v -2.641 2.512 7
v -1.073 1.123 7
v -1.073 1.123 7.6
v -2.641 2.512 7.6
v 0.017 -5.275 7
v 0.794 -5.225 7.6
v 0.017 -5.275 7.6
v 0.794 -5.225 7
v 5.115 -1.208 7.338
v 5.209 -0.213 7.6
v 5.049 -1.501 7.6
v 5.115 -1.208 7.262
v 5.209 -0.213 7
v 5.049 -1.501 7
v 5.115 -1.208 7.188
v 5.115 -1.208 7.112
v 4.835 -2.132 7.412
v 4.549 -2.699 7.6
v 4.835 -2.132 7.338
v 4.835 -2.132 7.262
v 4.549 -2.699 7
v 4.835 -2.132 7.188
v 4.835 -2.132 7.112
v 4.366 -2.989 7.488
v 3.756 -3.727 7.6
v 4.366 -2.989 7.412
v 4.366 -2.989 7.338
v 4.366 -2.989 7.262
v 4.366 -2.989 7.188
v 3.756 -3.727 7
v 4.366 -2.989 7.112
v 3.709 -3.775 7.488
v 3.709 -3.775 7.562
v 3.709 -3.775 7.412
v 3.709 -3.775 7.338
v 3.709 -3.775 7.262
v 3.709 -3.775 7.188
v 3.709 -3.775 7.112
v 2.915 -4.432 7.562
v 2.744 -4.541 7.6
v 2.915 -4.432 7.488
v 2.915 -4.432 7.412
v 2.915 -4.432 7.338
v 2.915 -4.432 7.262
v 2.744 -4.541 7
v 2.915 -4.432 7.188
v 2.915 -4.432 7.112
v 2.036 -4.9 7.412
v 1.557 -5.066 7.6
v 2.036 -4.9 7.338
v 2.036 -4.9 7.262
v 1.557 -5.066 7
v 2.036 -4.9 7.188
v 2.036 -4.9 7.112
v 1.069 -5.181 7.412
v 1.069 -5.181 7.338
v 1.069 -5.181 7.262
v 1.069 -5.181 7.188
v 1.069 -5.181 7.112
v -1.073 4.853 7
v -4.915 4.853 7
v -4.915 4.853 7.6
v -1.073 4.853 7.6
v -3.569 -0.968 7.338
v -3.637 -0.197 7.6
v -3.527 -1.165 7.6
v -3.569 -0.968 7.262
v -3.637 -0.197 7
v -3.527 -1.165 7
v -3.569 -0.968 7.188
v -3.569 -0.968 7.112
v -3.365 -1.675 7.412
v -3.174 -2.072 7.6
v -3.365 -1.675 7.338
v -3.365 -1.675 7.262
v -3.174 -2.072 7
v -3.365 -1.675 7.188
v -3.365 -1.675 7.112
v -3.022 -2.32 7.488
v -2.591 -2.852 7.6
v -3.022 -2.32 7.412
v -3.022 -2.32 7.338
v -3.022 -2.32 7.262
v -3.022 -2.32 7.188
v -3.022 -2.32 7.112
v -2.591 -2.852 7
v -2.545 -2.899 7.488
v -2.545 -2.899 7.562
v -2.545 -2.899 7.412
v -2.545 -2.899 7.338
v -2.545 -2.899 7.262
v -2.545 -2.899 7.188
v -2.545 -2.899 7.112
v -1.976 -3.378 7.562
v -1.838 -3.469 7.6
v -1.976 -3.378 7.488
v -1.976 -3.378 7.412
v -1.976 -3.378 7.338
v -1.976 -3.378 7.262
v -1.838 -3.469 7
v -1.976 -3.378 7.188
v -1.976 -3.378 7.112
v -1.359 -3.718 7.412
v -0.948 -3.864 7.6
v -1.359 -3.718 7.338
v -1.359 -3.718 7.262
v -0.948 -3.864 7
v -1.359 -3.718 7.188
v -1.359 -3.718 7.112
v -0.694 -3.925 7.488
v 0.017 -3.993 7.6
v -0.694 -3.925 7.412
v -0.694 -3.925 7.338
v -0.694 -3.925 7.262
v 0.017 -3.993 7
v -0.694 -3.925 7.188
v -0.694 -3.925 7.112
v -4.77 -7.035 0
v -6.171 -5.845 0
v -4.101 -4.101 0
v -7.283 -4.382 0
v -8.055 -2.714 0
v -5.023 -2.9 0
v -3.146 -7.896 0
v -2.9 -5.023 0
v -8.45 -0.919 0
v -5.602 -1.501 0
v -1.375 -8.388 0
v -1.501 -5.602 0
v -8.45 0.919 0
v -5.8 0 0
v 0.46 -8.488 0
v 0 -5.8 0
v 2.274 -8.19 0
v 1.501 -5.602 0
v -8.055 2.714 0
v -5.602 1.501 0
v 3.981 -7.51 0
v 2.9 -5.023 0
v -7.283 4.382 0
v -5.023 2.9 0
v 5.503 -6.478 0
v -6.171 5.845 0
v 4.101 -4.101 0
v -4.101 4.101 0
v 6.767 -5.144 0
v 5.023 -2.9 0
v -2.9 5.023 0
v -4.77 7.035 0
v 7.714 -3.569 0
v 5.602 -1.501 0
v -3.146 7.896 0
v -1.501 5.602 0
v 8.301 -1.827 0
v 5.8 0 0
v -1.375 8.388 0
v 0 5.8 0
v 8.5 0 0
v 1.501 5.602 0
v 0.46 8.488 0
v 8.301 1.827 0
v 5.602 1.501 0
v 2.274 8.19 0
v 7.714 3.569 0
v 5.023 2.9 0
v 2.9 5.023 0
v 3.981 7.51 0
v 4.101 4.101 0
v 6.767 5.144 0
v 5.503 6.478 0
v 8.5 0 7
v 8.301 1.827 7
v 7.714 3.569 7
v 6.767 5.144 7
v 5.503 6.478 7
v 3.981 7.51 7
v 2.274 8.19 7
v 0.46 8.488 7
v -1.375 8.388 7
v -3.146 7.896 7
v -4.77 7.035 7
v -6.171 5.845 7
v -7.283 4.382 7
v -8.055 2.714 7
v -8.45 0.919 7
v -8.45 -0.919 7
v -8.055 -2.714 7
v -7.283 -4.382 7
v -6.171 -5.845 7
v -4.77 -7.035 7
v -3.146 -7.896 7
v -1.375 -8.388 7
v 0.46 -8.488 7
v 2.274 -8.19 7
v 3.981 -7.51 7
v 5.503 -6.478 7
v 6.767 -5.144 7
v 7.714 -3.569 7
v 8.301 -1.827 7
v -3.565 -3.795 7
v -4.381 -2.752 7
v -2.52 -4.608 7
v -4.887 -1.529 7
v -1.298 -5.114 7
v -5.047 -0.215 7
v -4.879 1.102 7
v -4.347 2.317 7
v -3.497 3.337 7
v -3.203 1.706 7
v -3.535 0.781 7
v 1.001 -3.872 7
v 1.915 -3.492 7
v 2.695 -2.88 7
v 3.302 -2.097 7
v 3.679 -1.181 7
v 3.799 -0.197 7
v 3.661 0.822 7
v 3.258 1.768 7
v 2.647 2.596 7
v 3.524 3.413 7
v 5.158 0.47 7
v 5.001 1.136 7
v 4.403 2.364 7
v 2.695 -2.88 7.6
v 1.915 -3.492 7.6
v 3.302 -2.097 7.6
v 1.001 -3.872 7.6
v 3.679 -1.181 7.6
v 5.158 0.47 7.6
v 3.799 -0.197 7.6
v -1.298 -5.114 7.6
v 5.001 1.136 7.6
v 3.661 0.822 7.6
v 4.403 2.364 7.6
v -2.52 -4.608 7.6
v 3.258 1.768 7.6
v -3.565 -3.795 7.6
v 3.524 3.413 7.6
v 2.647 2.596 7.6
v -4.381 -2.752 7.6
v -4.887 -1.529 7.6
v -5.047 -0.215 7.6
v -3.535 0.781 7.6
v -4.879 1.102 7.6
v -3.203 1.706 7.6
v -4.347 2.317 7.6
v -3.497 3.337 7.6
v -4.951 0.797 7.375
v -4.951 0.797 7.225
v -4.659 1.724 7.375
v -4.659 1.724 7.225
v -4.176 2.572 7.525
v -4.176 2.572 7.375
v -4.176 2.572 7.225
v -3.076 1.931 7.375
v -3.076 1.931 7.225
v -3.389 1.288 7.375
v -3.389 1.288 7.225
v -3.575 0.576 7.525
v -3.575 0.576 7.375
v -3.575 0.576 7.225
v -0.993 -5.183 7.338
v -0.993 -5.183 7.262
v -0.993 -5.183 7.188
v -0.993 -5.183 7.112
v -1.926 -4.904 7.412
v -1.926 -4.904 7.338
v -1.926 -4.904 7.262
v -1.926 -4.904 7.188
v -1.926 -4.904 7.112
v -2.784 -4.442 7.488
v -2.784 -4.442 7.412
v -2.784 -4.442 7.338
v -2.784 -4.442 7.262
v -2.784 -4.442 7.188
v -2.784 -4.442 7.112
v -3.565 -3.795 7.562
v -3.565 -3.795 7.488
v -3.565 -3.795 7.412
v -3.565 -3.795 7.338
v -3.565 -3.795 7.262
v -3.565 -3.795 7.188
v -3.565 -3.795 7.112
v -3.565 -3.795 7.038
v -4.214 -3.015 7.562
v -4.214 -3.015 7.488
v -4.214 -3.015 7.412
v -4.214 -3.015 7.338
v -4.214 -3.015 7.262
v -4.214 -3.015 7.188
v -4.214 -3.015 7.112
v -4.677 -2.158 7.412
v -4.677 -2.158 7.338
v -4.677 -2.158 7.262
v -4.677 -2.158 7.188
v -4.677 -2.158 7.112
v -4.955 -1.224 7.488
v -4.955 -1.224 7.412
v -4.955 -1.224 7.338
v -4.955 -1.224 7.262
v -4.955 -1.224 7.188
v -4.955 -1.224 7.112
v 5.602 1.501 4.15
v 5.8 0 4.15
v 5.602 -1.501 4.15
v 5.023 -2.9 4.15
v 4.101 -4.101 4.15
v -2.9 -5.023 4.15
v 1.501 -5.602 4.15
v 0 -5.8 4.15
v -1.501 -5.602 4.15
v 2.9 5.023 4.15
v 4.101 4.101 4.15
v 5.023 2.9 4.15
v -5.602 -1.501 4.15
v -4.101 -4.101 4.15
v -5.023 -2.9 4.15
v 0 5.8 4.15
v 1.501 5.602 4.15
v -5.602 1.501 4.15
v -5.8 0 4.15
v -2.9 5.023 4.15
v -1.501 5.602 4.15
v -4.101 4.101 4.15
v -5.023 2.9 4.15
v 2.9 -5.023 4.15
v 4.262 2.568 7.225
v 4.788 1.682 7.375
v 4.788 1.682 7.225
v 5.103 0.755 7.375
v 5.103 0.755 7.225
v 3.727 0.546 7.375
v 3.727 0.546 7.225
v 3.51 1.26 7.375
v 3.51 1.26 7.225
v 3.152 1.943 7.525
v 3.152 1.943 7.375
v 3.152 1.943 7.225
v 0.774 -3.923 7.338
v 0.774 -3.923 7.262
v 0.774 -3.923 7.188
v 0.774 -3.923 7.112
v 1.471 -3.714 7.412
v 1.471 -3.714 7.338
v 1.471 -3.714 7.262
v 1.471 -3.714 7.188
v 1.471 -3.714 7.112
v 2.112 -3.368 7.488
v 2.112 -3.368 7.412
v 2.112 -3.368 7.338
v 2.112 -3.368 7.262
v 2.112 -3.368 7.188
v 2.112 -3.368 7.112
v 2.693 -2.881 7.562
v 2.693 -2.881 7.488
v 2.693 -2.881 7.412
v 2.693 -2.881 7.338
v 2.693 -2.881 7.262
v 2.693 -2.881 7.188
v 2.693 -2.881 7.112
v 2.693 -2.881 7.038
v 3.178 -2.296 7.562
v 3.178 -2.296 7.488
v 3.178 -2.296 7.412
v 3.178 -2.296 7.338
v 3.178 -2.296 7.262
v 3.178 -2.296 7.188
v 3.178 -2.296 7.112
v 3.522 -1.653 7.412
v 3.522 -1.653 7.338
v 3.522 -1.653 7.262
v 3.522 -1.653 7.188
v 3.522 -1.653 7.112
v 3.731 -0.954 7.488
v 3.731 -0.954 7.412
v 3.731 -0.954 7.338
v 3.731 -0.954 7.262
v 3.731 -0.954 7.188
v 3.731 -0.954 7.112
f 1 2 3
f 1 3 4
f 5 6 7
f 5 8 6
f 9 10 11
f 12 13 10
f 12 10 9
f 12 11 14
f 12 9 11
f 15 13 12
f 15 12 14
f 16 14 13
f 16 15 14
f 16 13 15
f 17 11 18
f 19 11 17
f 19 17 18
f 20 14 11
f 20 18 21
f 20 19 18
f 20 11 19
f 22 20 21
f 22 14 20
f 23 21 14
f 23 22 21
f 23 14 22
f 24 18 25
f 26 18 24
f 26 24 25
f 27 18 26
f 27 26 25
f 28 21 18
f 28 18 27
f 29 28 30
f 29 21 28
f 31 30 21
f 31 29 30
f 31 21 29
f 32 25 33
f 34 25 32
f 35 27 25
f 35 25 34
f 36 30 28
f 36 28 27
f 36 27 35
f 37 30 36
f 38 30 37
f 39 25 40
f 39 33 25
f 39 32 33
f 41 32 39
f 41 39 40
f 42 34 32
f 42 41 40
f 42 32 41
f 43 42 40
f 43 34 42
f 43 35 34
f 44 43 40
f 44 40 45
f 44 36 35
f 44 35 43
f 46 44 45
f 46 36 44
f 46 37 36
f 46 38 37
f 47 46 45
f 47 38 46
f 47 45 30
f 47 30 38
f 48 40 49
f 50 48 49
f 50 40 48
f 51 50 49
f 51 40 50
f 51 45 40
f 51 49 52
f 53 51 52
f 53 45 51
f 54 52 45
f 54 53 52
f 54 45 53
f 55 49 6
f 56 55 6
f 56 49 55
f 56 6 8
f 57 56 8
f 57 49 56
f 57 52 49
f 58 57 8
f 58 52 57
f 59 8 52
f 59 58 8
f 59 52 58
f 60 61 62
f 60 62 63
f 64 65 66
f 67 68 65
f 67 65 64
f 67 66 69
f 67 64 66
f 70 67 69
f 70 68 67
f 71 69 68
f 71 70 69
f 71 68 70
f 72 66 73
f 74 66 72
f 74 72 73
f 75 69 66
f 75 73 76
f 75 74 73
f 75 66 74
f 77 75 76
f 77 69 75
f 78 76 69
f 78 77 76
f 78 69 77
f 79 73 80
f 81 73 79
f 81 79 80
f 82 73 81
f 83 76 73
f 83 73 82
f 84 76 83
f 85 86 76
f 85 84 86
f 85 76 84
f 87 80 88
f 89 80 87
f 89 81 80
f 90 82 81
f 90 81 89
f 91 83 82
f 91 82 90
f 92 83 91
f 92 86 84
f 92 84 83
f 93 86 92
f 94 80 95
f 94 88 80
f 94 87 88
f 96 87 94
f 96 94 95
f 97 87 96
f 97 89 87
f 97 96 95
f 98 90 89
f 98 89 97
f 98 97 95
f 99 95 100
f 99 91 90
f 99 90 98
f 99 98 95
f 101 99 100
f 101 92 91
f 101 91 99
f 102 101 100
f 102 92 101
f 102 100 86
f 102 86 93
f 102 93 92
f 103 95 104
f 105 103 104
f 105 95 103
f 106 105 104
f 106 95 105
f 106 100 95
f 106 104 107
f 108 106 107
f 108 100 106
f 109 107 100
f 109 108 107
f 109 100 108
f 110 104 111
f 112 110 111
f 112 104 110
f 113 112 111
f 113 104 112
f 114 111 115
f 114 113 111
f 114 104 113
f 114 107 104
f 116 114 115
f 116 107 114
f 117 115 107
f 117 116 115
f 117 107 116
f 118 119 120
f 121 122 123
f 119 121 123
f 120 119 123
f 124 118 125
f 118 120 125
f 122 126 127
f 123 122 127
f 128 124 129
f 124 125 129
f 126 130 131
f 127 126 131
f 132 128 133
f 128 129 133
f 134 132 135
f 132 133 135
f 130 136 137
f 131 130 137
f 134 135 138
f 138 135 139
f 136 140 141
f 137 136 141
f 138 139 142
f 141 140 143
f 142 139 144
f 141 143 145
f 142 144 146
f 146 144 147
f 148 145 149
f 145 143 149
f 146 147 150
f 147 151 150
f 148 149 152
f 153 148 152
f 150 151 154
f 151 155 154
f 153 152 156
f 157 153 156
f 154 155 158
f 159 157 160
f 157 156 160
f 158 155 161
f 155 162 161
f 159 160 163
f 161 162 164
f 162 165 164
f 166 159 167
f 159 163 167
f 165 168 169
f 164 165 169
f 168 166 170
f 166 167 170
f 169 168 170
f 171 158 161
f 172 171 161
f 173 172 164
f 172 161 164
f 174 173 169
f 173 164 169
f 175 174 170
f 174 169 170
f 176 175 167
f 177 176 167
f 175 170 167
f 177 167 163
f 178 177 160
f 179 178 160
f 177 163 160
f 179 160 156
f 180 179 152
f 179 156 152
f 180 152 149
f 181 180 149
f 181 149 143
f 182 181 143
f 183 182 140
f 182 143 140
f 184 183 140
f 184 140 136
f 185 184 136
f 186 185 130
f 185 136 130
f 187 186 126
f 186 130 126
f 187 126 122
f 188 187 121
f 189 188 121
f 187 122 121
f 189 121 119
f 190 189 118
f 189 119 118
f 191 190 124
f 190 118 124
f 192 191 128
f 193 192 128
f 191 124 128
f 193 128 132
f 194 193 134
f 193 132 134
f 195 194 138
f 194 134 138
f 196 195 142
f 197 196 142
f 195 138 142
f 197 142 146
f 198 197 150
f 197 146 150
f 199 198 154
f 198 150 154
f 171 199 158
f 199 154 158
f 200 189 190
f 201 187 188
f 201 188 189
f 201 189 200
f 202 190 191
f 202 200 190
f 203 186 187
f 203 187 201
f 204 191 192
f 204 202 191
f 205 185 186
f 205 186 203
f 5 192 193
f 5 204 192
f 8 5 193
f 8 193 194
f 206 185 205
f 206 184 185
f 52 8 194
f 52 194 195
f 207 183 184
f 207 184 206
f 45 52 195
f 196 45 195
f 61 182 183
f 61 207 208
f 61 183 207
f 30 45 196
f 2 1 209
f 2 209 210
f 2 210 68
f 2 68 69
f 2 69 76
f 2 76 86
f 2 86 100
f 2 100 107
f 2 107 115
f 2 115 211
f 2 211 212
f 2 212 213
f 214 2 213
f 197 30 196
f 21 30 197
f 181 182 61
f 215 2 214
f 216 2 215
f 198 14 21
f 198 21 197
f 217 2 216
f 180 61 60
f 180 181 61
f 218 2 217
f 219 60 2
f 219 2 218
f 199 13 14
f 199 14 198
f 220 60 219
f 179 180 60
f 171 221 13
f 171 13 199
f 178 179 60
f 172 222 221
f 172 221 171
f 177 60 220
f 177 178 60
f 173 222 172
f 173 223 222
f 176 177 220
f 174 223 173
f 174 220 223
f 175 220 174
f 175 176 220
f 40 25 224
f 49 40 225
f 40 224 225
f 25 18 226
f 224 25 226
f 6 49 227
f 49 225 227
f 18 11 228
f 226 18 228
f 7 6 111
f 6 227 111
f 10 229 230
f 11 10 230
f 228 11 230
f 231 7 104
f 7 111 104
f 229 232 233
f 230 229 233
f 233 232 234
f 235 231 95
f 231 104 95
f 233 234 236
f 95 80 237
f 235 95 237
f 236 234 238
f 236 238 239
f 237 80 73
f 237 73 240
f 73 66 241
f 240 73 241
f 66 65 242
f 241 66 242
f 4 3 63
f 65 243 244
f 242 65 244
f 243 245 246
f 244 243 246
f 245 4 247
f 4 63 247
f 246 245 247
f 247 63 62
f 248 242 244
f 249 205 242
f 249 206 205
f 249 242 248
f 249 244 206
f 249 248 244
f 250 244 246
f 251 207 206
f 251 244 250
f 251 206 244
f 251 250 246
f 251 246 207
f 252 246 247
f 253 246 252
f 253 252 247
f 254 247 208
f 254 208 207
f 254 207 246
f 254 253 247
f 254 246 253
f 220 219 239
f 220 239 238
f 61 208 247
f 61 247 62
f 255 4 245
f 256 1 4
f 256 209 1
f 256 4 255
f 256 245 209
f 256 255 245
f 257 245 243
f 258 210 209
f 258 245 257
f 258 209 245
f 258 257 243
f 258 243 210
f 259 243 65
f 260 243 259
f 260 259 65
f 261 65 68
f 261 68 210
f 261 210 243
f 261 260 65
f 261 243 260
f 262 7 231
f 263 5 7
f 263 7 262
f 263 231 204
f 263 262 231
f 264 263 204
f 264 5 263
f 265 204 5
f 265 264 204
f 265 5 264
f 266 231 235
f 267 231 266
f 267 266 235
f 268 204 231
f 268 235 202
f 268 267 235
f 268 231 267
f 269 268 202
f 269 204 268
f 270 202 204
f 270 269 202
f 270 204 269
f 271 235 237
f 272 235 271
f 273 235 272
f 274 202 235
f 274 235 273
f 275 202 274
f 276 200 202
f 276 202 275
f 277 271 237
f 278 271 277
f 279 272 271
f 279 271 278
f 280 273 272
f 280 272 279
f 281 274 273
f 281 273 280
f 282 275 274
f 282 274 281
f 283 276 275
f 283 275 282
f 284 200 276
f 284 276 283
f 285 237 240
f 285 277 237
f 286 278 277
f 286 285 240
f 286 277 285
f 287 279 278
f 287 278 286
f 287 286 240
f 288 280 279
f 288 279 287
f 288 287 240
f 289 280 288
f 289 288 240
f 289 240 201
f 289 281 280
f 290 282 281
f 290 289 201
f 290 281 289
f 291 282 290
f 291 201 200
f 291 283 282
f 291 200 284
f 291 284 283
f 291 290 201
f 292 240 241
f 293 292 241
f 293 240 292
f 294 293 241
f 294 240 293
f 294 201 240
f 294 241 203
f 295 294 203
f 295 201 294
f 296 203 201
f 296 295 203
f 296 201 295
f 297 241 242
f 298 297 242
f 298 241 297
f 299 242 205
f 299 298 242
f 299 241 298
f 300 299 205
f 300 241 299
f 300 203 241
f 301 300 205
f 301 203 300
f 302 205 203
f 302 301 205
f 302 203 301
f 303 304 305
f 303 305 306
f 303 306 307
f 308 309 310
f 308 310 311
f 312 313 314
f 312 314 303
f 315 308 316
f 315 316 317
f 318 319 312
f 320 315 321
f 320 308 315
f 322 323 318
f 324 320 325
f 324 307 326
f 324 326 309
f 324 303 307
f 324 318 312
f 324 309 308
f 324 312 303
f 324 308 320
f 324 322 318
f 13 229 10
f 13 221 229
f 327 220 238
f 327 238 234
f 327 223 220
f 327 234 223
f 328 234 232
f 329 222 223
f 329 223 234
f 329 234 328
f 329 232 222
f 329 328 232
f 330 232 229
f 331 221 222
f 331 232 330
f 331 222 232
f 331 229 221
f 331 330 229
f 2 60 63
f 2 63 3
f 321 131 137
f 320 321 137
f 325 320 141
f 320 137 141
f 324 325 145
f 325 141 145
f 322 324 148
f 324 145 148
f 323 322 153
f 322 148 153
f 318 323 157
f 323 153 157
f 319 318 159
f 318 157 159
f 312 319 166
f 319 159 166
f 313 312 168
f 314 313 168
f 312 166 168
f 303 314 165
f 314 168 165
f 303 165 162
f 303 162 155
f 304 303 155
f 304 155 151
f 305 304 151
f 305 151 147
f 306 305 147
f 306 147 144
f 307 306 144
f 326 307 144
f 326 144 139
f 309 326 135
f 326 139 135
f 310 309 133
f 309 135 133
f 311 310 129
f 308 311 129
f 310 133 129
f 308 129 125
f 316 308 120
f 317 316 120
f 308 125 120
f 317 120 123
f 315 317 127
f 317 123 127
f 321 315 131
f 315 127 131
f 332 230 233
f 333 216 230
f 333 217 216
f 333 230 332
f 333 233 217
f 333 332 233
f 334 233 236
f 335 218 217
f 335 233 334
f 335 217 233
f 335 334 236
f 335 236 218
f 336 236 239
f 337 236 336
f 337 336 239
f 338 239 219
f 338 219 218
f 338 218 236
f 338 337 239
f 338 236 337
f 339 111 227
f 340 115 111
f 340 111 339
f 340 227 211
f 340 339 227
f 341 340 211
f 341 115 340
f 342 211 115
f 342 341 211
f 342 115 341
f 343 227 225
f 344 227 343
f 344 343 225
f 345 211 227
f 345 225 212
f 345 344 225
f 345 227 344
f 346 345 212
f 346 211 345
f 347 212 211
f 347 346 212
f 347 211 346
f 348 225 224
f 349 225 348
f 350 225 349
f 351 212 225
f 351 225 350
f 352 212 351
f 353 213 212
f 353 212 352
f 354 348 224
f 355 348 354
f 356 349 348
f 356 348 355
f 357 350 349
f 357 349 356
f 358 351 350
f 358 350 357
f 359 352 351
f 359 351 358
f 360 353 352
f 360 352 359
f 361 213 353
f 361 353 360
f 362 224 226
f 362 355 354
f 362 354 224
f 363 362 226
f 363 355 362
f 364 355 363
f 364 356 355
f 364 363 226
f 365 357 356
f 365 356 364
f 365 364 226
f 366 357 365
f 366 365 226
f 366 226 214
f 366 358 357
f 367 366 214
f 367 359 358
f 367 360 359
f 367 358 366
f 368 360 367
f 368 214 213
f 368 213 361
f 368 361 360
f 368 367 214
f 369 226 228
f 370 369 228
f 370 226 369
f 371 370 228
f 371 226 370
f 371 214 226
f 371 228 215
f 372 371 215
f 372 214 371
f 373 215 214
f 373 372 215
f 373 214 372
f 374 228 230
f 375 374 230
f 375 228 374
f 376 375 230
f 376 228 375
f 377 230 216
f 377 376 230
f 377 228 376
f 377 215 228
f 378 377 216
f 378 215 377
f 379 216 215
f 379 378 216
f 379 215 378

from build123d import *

# Parameters (mm, degrees)
SKETCH1_R           = 8.5
BOSS_EXTRUDE1_DEPTH = 7
BOSS_EXTRUDE2_DEPTH = 0.6
SKETCH3_R           = 5.8
CUT_EXTRUDE1_DEPTH  = 4.15


with BuildPart() as part:
    # Sketch1 → Boss-Extrude1 (new body)
    with BuildSketch(Plane.XY):
        Circle(SKETCH1_R)
    extrude(amount=BOSS_EXTRUDE1_DEPTH)

    # Sketch2 → Boss-Extrude2 (add)
    with BuildSketch(Plane.XY.offset(7)):
        with BuildLine():
            Line((-3.496777173, 3.33685478), (-4.915046404, 4.853281062))
            Line((-4.915046404, 4.853281062), (-1.072898968, 4.853281062))
            Line((-1.072898968, 4.853281062), (-1.072898968, 1.123313114))
            Line((-1.072898968, 1.123313114), (-2.641408583, 2.511534267))
            add(Edge.make_bspline(
                [(-2.641408583, 2.511534267), (-2.720753384, 2.418855801), (-2.878322384, 2.234807782), (-3.080326614, 1.933878452), (-3.253390687, 1.61912069), (-3.395661366, 1.287378065), (-3.502208895, 0.938351436), (-3.581164136, 0.573998239), (-3.627606924, 0.193691534), (-3.633833749, -0.065128908), (-3.637001532, -0.196799066)],
                knots=[0, 0, 0, 0, 0.990413106, 1.966838421, 2.937869788, 3.905121185, 4.893378033, 5.897730606, 6.93050896, 8, 8, 8, 8], degree=3))
            add(Edge.make_bspline(
                [(-3.637001532, -0.196799066), (-3.633314081, -0.328490722), (-3.626080362, -0.586831876), (-3.575666424, -0.966879106), (-3.48901189, -1.329477593), (-3.370773292, -1.677822622), (-3.215507272, -2.009168524), (-3.026563561, -2.324364608), (-2.80395201, -2.623800683), (-2.549784804, -2.902253094), (-2.273703911, -3.157129382), (-1.982206578, -3.380716481), (-1.679065211, -3.570884015), (-1.361911881, -3.723224656), (-1.034237343, -3.844640529), (-0.694609323, -3.930992109), (-0.342601775, -3.981888324), (-0.104181125, -3.989174312), (0.016844622, -3.992872784)],
                knots=[0, 0, 0, 0, 1.079250243, 2.117178572, 3.135310327, 4.130457806, 5.126943688, 6.12839153, 7.13757049, 8.179760785, 9.213873081, 10.213240201, 11.186661469, 12.141254978, 13.091823965, 14.04618213, 15.008213981, 16, 16, 16, 16], degree=3))
            add(Edge.make_bspline(
                [(0.016844622, -3.992872784), (0.145225127, -3.989328055), (0.399045702, -3.982319786), (0.771483518, -3.92919274), (1.130051724, -3.842959504), (1.473171339, -3.720575099), (1.801926634, -3.562161434), (2.117866526, -3.372942158), (2.41516878, -3.142633465), (2.697195125, -2.885792453), (2.953892432, -2.602154952), (3.182127427, -2.302868546), (3.370336038, -1.984922834), (3.528939332, -1.656080542), (3.648009639, -1.310669225), (3.73821301, -0.953238154), (3.787712727, -0.57946122), (3.795125716, -0.325806083), (3.798895904, -0.196799066)],
                knots=[0, 0, 0, 0, 1.033612209, 2.043550498, 3.023051526, 3.999358907, 4.971079349, 5.957874823, 6.959200849, 7.994476354, 9.02612831, 10.03602365, 11.020045963, 11.99661988, 12.971133653, 13.957137591, 14.961016167, 16, 16, 16, 16], degree=3))
            add(Edge.make_bspline(
                [(3.798895904, -0.196799066), (3.795452622, -0.071738589), (3.788588973, 0.177550022), (3.732512198, 0.547316376), (3.642339714, 0.909630301), (3.515407262, 1.263936549), (3.351110497, 1.609595982), (3.154582121, 1.949790991), (2.919499892, 2.281514078), (2.739012005, 2.489632171), (2.647052955, 2.595668883)],
                knots=[0, 0, 0, 0, 0.970334418, 1.934210747, 2.895854909, 3.864734812, 4.850109812, 5.862644845, 6.911011974, 8, 8, 8, 8], degree=3))
            Line((2.647052955, 2.595668883), (3.524456802, 3.412976575))
            add(Edge.make_bspline(
                [(3.524456802, 3.412976575), (3.658278985, 3.275504412), (3.91937115, 3.007290997), (4.264397959, 2.578686277), (4.553163347, 2.138040406), (4.795240196, 1.68988536), (4.980930526, 1.228890741), (5.110227561, 0.756857332), (5.195045563, 0.27566711), (5.204437058, -0.049543732), (5.209152314, -0.212824707)],
                knots=[0, 0, 0, 0, 1.119978514, 2.185120635, 3.207184244, 4.192840501, 5.155195957, 6.102228941, 7.047172264, 8, 8, 8, 8], degree=3))
            add(Edge.make_bspline(
                [(5.209152314, -0.212824707), (5.204540212, -0.382014013), (5.195439592, -0.715859062), (5.12297081, -1.207015128), (5.007595574, -1.680619371), (4.842005, -2.136576039), (4.627397829, -2.574094346), (4.371358267, -2.997310094), (4.06311267, -3.39955484), (3.713795898, -3.780248165), (3.331337364, -4.130160805), (2.922899491, -4.437565389), (2.490856262, -4.694704345), (2.038857832, -4.9089885), (1.563247201, -5.073941917), (1.066251184, -5.188891521), (0.548487363, -5.261364491), (0.196039665, -5.270353687), (0.016844622, -5.274924066)],
                knots=[0, 0, 0, 0, 1.006511856, 1.986053414, 2.947928005, 3.903304009, 4.866581259, 5.843887477, 6.842136409, 7.877167342, 8.915131082, 9.922897295, 10.913810849, 11.902179308, 12.895003365, 13.90323956, 14.933943735, 16, 16, 16, 16], degree=3))
            add(Edge.make_bspline(
                [(0.016844622, -5.274924066), (-0.154981037, -5.270101549), (-0.493322306, -5.26060555), (-0.991507142, -5.1914642), (-1.470001358, -5.07522348), (-1.929693111, -4.911786456), (-2.370270316, -4.702826529), (-2.791145936, -4.446149677), (-3.192948817, -4.14431338), (-3.57070976, -3.800322782), (-3.913756475, -3.422137917), (-4.219341638, -3.023295532), (-4.474952699, -2.601787942), (-4.684175633, -2.161406889), (-4.847542361, -1.701662708), (-4.963802172, -1.22318273), (-5.032938356, -0.724994042), (-5.042435065, -0.386653302), (-5.047257942, -0.214827912)],
                knots=[0, 0, 0, 0, 1.035645246, 2.039285224, 3.025359342, 3.999339005, 4.975246586, 5.959692554, 6.966033149, 8.00039464, 9.034756131, 10.040307446, 11.024753414, 12.000660995, 12.974640658, 13.960714776, 14.964354754, 16, 16, 16, 16], degree=3))
            add(Edge.make_bspline(
                [(-5.047257942, -0.214827912), (-5.042718501, -0.042971038), (-5.033757492, 0.296280149), (-4.960307444, 0.794688321), (-4.838251028, 1.272224933), (-4.665501402, 1.727921947), (-4.449759875, 2.165386428), (-4.180027486, 2.580020601), (-3.863065273, 2.974774534), (-3.620105292, 3.214943433), (-3.496777173, 3.33685478)],
                knots=[0, 0, 0, 0, 1.032765718, 2.038713884, 3.021079012, 3.990324489, 4.963319928, 5.947610502, 6.958193293, 8, 8, 8, 8], degree=3))
        make_face()
    extrude(amount=BOSS_EXTRUDE2_DEPTH)

    # Sketch3 → Cut-Extrude1 (cut)
    with BuildSketch(Plane(origin=(0, 0, 0), x_dir=(-1, 0, 0), z_dir=(0, 0, -1))):
        Circle(SKETCH3_R)
    extrude(amount=-CUT_EXTRUDE1_DEPTH, mode=Mode.SUBTRACT)


solid = part.part
